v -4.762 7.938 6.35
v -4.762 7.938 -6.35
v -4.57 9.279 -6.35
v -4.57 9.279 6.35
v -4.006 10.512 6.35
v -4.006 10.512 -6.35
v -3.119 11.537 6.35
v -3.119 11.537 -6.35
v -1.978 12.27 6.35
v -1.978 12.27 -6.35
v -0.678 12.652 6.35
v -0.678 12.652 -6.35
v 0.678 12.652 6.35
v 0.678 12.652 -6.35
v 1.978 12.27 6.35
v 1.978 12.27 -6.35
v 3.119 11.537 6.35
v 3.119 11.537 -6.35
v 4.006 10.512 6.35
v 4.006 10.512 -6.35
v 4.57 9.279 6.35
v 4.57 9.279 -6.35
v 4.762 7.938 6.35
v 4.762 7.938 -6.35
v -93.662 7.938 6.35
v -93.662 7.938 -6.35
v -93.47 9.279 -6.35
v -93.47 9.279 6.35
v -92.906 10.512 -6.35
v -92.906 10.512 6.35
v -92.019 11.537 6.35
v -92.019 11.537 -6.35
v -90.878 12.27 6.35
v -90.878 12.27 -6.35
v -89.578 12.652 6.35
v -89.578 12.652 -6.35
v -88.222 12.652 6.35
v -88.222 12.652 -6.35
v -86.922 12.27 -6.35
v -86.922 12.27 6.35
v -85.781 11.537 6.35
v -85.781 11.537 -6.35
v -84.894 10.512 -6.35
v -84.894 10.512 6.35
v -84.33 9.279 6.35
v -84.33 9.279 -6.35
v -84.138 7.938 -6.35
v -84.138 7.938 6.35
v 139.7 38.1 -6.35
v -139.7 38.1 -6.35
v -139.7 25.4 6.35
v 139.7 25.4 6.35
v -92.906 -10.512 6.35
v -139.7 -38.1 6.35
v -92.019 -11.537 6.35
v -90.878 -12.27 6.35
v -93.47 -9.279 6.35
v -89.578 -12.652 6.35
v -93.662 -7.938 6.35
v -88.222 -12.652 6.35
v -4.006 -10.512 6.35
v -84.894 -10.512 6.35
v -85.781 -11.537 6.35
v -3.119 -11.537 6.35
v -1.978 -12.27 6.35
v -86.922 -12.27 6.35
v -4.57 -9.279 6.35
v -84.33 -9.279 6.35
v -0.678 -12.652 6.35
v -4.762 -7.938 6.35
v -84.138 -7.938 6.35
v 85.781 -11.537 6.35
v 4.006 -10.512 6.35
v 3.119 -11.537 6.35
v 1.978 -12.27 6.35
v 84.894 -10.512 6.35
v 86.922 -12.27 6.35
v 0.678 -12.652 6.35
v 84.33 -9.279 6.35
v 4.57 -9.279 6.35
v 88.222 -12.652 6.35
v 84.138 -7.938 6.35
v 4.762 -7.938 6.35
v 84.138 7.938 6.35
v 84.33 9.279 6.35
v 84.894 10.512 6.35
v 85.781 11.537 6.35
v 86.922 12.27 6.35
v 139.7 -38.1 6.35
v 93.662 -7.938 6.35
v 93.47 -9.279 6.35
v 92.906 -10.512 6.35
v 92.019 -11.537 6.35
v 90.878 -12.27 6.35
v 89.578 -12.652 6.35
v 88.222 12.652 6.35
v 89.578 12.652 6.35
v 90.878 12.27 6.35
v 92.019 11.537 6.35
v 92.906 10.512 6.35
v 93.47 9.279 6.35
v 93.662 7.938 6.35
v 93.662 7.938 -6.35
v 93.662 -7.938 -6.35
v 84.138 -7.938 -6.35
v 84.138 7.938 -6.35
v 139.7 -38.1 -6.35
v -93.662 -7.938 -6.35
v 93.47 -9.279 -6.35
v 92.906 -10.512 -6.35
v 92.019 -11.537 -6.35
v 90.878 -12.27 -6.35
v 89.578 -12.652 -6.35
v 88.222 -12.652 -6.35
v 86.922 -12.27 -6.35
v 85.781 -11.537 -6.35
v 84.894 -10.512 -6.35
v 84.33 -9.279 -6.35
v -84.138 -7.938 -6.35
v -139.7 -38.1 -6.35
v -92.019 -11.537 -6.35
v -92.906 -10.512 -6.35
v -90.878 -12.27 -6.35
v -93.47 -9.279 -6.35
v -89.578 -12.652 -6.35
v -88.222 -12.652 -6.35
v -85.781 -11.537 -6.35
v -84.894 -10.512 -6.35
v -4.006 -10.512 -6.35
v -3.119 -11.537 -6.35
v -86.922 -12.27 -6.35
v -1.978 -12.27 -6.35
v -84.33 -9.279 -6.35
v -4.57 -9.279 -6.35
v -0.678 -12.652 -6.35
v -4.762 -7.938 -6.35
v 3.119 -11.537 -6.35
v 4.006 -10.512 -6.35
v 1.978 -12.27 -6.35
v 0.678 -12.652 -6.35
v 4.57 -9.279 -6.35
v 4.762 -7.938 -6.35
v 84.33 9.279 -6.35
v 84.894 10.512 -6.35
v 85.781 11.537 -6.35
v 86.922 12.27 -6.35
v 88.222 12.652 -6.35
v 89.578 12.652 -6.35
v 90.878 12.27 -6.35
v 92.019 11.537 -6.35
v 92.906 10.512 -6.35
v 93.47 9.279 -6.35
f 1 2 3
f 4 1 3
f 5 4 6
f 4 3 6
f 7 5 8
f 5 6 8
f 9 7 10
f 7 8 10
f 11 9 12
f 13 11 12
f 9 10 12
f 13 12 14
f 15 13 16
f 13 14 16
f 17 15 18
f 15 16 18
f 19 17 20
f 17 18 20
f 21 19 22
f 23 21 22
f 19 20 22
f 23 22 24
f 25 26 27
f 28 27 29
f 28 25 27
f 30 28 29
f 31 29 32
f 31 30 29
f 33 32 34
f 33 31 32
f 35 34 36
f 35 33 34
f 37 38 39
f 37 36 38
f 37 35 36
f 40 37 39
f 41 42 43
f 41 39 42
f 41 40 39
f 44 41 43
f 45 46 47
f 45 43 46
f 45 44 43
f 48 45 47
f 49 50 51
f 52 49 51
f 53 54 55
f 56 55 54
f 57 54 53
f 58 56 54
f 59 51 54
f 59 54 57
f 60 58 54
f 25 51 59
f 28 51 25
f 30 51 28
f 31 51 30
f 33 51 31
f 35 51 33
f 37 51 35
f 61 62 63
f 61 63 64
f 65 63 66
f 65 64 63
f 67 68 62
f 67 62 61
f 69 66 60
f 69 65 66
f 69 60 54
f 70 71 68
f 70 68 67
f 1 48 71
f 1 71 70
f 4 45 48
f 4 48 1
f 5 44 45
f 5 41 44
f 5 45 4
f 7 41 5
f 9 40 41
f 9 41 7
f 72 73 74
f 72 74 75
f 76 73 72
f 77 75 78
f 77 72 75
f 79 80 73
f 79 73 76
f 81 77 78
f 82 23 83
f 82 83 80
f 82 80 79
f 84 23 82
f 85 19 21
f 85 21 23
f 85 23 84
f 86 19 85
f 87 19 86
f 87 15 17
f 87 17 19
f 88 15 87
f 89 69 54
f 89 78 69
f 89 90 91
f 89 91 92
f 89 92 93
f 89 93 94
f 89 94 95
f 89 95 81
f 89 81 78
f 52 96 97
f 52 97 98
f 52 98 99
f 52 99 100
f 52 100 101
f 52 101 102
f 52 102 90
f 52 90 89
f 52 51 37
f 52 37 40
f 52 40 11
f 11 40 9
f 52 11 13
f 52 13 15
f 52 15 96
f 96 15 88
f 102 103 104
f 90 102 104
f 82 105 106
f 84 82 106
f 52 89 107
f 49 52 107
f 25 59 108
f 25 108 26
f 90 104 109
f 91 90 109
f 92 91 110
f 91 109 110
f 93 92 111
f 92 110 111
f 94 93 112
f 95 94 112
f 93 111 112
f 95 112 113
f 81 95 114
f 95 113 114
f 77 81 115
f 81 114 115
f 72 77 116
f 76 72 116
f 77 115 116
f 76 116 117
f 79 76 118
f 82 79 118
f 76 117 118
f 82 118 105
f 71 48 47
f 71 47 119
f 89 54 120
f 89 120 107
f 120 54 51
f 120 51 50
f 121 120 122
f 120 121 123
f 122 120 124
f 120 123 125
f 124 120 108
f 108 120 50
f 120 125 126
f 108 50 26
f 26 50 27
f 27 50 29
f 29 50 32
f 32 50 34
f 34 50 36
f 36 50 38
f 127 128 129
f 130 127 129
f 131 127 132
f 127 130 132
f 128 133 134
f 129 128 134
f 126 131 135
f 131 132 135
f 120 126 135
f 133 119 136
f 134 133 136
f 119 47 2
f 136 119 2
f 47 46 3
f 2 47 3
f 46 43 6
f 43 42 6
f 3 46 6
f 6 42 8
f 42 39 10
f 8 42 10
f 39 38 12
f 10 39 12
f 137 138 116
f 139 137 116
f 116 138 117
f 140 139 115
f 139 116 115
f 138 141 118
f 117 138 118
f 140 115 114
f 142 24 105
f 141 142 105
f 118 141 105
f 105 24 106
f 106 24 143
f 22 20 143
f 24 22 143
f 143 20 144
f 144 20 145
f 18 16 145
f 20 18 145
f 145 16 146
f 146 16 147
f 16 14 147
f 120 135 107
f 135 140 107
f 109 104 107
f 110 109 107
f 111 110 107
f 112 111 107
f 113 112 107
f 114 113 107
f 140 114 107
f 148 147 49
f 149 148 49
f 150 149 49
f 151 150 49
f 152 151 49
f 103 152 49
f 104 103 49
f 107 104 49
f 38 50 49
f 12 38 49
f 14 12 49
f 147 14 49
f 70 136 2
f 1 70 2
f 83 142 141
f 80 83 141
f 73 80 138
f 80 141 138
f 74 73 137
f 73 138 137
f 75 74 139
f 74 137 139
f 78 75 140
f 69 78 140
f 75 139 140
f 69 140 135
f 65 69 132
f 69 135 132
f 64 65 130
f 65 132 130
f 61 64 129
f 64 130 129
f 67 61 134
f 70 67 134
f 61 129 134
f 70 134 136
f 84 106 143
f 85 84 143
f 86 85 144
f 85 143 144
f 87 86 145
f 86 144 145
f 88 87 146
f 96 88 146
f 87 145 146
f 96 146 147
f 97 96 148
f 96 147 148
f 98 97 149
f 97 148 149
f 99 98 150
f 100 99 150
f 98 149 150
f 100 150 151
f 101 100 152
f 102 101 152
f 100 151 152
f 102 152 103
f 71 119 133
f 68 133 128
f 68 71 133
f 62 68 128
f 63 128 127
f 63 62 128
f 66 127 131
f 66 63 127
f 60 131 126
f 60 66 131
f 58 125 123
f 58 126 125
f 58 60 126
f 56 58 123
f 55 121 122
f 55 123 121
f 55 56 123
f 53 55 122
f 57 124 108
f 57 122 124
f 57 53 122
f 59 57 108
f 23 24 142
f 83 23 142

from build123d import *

# Parameters (mm, degrees)
SKETCH1_W           = 279.4
SKETCH1_H           = 76.2
BOSS_EXTRUDE1_DEPTH = 6.35
CUT_EXTRUDE2_DEPTH  = 139.7
CUT_EXTRUDE3_DEPTH  = 38.1


with BuildPart() as part:
    # Sketch1 → Boss-Extrude1 (new, symmetric)
    with BuildSketch(Plane.XY):
        Rectangle(SKETCH1_W, SKETCH1_H)
    extrude(amount=BOSS_EXTRUDE1_DEPTH, both=True)

    # Sketch2 → Cut-Extrude2 (cut, symmetric)
    with BuildSketch(Plane(origin=(0, 0, 0), x_dir=(0, 0, -1), z_dir=(1, 0, 0))):
        Polygon((6.35, 38.1), (-6.35, 25.4), (-6.35, 38.1), align=None)
    extrude(amount=CUT_EXTRUDE2_DEPTH, both=True, mode=Mode.SUBTRACT)

    # Sketch3 → Cut-Extrude3 (cut, symmetric)
    with BuildSketch(Plane.XY):
        with BuildLine():
            Line((84.1375, -7.9375), (84.1375, 7.9375))
            ThreePointArc((84.1375, 7.9375), (88.9, 12.7), (93.6625, 7.9375))
            Line((93.6625, 7.9375), (93.6625, -7.9375))
            ThreePointArc((93.6625, -7.9375), (88.9, -12.7), (84.1375, -7.9375))
        make_face()
        with BuildLine():
            Line((-4.7625, -7.9375), (-4.7625, 7.9375))
            ThreePointArc((-4.7625, 7.9375), (0, 12.7), (4.7625, 7.9375))
            Line((4.7625, 7.9375), (4.7625, -7.9375))
            ThreePointArc((4.7625, -7.9375), (0, -12.7), (-4.7625, -7.9375))
        make_face()
        with BuildLine():
            Line((-93.6625, -7.9375), (-93.6625, 7.9375))
            ThreePointArc((-93.6625, 7.9375), (-88.9, 12.7), (-84.1375, 7.9375))
            Line((-84.1375, 7.9375), (-84.1375, -7.9375))
            ThreePointArc((-84.1375, -7.9375), (-88.9, -12.7), (-93.6625, -7.9375))
        make_face()
    extrude(amount=CUT_EXTRUDE3_DEPTH, both=True, mode=Mode.SUBTRACT)


solid = part.part
